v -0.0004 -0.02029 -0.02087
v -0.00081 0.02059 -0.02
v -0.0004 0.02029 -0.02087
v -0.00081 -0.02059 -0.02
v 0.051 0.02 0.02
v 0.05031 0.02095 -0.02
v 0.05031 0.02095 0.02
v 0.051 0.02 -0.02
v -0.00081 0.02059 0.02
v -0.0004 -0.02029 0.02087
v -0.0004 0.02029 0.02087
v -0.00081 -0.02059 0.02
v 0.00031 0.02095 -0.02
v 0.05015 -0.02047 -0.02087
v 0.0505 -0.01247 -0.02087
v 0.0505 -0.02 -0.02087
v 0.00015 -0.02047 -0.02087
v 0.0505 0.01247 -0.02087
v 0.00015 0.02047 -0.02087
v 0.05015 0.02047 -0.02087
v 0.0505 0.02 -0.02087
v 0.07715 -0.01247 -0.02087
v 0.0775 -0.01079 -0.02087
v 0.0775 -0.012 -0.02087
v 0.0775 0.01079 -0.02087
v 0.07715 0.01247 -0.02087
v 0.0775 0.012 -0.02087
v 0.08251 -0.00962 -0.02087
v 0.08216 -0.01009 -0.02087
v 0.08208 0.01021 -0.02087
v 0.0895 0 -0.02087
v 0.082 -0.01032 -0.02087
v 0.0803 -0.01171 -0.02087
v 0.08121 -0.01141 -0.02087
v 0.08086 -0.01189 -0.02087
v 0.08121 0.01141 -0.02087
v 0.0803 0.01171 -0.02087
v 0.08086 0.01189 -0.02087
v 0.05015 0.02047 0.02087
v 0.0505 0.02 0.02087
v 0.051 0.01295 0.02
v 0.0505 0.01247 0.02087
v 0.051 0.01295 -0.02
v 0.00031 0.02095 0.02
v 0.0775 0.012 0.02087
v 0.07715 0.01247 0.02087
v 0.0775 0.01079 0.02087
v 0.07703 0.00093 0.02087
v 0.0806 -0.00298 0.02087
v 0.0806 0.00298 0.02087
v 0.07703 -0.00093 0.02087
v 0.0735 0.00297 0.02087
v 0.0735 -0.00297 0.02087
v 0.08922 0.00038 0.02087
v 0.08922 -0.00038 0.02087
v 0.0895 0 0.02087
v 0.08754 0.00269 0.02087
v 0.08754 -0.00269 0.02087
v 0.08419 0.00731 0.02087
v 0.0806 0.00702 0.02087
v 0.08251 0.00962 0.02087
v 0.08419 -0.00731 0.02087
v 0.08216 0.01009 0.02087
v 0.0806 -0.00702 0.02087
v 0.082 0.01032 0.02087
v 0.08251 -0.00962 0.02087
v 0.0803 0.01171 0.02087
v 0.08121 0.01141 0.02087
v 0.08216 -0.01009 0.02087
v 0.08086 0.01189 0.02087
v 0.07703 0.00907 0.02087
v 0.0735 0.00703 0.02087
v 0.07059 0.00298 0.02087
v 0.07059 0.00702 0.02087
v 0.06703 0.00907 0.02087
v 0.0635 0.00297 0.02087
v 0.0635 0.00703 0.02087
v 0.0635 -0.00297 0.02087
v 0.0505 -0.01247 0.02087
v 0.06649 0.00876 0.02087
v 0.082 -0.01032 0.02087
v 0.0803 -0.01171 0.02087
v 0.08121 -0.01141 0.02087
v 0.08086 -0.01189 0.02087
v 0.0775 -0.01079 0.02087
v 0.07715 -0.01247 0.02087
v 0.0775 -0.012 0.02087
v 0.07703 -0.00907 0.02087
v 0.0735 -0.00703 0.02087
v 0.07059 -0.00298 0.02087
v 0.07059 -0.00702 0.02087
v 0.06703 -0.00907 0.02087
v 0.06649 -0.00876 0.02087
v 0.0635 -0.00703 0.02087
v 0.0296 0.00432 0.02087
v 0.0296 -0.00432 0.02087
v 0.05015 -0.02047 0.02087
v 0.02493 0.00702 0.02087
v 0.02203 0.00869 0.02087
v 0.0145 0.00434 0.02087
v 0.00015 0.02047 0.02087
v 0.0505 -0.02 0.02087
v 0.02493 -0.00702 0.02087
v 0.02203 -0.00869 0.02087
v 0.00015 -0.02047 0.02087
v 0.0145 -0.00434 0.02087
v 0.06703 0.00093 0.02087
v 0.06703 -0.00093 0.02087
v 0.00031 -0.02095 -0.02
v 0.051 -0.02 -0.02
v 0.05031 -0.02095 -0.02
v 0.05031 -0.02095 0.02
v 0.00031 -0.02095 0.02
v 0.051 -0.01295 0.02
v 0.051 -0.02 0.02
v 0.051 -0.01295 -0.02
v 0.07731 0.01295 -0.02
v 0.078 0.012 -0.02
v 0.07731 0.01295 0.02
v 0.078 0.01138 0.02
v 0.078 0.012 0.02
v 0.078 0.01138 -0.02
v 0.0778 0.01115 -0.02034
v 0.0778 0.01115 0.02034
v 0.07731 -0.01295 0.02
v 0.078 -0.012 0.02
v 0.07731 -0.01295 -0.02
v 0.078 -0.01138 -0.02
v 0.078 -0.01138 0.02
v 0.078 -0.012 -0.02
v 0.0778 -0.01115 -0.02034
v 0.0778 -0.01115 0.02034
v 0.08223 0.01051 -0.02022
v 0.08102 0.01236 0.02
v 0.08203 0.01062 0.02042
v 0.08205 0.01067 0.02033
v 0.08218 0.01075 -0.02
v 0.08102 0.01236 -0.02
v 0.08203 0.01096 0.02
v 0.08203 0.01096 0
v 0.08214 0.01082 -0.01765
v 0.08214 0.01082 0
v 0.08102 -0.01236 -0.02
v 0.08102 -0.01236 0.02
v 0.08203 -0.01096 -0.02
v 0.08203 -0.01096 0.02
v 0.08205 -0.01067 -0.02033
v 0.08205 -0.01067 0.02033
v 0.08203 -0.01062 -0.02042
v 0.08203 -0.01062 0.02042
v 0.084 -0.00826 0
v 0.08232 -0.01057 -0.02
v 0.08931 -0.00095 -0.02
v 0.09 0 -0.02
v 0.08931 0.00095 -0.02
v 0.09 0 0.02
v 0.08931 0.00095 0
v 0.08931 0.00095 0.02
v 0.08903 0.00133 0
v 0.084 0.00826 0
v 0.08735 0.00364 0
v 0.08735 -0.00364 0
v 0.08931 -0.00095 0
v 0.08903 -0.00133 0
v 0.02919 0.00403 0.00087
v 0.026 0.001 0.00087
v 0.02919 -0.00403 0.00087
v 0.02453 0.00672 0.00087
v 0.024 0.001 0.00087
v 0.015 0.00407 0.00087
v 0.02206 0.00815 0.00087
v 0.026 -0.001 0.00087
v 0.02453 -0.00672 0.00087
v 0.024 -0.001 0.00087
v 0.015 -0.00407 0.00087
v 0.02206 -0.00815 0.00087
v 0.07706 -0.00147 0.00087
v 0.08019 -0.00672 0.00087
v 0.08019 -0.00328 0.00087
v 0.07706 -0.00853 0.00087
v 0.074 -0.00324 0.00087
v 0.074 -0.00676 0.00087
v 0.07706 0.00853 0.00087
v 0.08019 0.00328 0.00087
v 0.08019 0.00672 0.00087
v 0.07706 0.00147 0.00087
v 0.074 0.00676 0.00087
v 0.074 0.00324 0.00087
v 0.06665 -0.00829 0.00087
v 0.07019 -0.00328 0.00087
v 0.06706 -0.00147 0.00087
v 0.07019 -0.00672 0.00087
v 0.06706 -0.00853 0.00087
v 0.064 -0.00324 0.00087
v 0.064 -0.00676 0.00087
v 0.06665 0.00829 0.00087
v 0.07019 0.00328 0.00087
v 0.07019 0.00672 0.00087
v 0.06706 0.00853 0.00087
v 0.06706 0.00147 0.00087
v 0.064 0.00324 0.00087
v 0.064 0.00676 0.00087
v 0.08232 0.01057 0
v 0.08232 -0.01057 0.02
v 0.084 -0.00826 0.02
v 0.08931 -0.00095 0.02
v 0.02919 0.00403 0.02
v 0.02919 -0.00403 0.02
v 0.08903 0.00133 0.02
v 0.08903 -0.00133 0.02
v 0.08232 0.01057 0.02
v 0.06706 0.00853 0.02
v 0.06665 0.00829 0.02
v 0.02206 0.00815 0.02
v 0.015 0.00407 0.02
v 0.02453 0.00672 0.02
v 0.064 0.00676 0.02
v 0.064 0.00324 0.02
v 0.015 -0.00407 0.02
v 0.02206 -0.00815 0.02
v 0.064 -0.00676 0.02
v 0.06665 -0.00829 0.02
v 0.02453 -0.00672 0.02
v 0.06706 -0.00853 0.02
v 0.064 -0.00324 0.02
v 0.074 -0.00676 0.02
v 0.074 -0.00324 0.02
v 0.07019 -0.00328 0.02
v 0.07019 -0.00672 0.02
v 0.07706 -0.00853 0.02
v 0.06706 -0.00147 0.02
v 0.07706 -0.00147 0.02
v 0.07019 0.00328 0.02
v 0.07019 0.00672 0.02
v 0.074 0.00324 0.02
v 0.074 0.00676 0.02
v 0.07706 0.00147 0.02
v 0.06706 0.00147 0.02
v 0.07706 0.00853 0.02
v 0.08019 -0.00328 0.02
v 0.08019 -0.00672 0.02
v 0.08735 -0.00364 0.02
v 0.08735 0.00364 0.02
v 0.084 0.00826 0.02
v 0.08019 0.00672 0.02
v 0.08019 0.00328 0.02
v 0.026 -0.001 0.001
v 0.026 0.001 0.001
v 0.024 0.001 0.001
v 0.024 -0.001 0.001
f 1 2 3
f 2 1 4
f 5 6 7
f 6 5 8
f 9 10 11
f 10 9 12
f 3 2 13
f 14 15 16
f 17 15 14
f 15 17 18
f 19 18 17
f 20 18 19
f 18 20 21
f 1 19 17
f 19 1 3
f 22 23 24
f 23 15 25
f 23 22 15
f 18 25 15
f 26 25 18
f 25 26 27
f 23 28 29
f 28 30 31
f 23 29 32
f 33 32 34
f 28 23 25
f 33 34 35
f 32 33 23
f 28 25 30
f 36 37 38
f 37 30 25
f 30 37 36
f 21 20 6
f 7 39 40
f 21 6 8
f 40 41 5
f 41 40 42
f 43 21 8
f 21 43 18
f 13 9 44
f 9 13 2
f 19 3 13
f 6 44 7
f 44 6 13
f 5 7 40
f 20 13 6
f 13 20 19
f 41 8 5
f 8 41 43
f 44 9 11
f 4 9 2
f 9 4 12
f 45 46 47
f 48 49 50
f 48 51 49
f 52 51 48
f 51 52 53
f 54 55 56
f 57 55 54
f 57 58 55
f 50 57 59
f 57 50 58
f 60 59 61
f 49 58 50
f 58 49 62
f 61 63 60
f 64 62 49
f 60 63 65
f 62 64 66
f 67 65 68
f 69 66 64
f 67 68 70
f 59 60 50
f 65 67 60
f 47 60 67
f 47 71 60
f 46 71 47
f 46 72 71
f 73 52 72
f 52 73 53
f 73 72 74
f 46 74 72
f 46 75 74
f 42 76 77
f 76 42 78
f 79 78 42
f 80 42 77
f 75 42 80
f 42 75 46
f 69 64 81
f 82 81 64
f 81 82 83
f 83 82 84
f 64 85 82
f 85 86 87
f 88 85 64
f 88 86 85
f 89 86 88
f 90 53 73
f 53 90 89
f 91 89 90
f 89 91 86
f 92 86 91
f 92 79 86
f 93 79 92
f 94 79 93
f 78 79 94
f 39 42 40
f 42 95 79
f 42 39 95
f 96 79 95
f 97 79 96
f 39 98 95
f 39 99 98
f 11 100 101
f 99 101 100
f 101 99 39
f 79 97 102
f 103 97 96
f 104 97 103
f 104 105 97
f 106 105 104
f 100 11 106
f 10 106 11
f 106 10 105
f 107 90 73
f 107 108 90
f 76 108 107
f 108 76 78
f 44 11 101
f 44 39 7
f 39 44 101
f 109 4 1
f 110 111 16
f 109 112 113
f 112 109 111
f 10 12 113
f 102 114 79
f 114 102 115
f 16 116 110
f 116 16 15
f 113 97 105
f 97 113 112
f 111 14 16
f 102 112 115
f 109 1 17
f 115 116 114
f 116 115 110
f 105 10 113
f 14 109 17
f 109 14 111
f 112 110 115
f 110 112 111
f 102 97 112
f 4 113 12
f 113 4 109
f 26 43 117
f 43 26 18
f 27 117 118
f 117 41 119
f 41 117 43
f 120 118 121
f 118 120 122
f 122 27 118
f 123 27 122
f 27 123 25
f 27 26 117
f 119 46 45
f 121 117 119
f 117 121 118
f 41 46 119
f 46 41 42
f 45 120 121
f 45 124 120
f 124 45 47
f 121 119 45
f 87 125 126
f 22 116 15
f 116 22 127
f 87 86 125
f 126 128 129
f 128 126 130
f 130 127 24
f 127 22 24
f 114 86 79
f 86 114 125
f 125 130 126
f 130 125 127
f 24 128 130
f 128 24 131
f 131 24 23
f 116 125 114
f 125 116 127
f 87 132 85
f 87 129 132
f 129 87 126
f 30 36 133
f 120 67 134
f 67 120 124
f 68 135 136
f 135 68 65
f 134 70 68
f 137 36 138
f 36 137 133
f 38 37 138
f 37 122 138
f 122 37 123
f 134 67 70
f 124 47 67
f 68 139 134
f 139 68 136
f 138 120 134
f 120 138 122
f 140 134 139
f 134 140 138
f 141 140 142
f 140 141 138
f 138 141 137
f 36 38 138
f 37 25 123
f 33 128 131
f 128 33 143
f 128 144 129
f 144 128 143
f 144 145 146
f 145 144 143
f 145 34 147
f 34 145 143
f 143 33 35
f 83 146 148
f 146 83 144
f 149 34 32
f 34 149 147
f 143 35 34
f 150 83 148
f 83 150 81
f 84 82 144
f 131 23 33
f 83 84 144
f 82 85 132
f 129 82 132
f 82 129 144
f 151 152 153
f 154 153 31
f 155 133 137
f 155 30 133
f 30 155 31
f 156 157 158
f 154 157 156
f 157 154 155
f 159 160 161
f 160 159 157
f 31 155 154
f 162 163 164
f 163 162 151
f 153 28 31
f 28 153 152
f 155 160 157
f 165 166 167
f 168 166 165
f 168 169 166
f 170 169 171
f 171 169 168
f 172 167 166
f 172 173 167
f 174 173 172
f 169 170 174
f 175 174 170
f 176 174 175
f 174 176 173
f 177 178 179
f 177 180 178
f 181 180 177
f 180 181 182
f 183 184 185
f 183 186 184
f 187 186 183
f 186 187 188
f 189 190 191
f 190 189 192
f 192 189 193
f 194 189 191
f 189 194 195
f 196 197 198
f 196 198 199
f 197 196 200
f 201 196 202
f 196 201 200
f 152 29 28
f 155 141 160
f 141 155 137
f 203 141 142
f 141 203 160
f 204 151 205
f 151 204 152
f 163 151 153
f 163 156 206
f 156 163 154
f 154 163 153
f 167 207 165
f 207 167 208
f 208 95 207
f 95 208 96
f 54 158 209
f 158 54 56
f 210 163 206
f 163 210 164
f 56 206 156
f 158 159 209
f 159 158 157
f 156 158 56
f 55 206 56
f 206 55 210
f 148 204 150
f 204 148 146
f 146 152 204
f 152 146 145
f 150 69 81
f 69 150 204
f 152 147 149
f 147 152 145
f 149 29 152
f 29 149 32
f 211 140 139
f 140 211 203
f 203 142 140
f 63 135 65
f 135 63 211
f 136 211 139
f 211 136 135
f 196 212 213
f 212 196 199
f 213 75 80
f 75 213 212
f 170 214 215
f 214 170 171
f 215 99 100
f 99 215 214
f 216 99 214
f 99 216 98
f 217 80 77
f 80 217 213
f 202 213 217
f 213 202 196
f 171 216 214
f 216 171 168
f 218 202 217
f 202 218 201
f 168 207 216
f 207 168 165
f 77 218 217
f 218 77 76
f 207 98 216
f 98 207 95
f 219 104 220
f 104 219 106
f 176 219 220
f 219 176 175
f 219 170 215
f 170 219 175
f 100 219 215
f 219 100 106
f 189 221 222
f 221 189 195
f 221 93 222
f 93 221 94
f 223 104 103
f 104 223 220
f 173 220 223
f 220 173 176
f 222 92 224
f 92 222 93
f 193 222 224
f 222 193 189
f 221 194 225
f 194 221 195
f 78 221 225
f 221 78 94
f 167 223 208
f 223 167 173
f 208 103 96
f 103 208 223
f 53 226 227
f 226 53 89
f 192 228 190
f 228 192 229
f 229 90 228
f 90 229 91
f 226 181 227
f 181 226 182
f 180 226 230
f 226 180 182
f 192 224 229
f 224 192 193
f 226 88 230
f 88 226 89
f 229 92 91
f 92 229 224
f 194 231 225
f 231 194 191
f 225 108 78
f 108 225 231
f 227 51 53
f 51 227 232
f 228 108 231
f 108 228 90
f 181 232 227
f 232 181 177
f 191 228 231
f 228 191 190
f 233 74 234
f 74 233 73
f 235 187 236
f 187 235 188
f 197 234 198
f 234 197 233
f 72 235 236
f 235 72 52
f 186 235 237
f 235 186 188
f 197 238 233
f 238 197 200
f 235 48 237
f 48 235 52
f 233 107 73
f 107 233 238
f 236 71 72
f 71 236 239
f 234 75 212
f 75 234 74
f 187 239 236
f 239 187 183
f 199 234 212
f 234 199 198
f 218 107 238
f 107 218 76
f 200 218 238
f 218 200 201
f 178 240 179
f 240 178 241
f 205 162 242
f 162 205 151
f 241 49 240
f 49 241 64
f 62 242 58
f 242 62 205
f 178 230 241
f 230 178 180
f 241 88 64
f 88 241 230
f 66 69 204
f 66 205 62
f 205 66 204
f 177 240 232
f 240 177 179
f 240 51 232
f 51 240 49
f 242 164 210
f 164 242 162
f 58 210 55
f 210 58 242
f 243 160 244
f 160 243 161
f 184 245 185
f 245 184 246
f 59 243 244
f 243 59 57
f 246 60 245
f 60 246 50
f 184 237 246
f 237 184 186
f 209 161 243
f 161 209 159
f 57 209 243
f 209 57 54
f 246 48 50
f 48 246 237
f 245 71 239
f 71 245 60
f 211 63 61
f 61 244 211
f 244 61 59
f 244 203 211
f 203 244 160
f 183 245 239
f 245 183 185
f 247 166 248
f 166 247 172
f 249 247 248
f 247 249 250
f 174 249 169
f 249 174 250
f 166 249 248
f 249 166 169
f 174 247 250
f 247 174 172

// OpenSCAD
// Parameters
L = 0.09; //[0.045:0.18:0.001]
W = 0.04; //[0.02:0.08:0.001]
T = 0.04; //[0.02:0.08:0.001]
L_base = 0.05; //[0.025:0.1:0.001]
L_tongue = 0.04; //[0.02:0.08:0.001]
W_tongue = 0.024; //[0.012:0.048:0.001]
tip_r = 0.012; //[0.006:0.024:0.001]
step_x = 0.05; //[0.025:0.1:0.001]
hex_large_af = 0.016; //[0.008:0.032:0.001]
hex_large_x = 0.022; //[0.011:0.044:0.001]
hex_large_y = 0.0; //[-0.01:0.01:0.001]
hex_small_af = 0.008; //[0.004:0.016:0.001]
hex_small_center_x = 0.072; //[0.036:0.144:0.001]
hex_small_dx = 0.01; //[0.005:0.02:0.001]
hex_small_dy = 0.01; //[0.005:0.02:0.001]
hole_extra_h = 0.02; //[0.01:0.04:0.001]
overlap = 0.001; //[0.0005:0.002:0.0005]
edge_fillet_r = 0.001; //[0.0:0.004:0.0005]

// Helper function to create a hexagonal hole
module hex_hole(radius, height) {
  rotate([0, 0, 30])
  cylinder(h=height, r=radius, $fn=6);
}

// Main body of the plate
module plate_main_body() {
  translate([L_base/2, 0, 0])
  cube([L_base, W, T], center=true);
}

// Tongue section with rounded tip
module plate_tongue_with_rounded_tip() {
  union() {
    translate([step_x + (L_tongue - tip_r)/2 - overlap, 0, 0])
    cube([L_tongue - tip_r, W_tongue, T], center=true);
    translate([step_x + (L_tongue - tip_r) - overlap, 0, 0])
    cylinder(r=tip_r, h=T, center=true);
  }
}

// Step transition shoulder
module step_transition_shoulder() {
  translate([step_x - overlap, 0, 0])
  cube([overlap*2, W, T], center=true);
}

// Large hexagonal hole
module hex_hole_large() {
  translate([hex_large_x, hex_large_y, 0])
  hex_hole(hex_large_af/1.7320508075688772, T + hole_extra_h);
}

// Small hexagonal holes in 2x2 pattern
module hex_hole_small_pattern() {
  for (x = [-hex_small_dx/2, hex_small_dx/2])
    for (y = [-hex_small_dy/2, hex_small_dy/2])
      translate([hex_small_center_x + x, y, 0])
      hex_hole(hex_small_af/1.7320508075688772, T + hole_extra_h);
}

// Edge fillets or chamfers
module edge_fillets_or_chamfers() {
  if (edge_fillet_r > 0) {
    minkowski() {
      plate_with_holes();
      sphere(r=edge_fillet_r, center=true);
    }
  } else {
    plate_with_holes();
  }
}

// Plate with holes
module plate_with_holes() {
  difference() {
    union() {
      plate_main_body();
      plate_tongue_with_rounded_tip();
      step_transition_shoulder();
    }
    hex_hole_large();
    hex_hole_small_pattern();
  }
}

// Final model
module final_model() {
  union() {
    edge_fillets_or_chamfers();
    translate([L_base/2, 0, 0])
    cube([overlap*2, overlap*2, overlap*2], center=true);
  }
}

// Render the final model
final_model();
